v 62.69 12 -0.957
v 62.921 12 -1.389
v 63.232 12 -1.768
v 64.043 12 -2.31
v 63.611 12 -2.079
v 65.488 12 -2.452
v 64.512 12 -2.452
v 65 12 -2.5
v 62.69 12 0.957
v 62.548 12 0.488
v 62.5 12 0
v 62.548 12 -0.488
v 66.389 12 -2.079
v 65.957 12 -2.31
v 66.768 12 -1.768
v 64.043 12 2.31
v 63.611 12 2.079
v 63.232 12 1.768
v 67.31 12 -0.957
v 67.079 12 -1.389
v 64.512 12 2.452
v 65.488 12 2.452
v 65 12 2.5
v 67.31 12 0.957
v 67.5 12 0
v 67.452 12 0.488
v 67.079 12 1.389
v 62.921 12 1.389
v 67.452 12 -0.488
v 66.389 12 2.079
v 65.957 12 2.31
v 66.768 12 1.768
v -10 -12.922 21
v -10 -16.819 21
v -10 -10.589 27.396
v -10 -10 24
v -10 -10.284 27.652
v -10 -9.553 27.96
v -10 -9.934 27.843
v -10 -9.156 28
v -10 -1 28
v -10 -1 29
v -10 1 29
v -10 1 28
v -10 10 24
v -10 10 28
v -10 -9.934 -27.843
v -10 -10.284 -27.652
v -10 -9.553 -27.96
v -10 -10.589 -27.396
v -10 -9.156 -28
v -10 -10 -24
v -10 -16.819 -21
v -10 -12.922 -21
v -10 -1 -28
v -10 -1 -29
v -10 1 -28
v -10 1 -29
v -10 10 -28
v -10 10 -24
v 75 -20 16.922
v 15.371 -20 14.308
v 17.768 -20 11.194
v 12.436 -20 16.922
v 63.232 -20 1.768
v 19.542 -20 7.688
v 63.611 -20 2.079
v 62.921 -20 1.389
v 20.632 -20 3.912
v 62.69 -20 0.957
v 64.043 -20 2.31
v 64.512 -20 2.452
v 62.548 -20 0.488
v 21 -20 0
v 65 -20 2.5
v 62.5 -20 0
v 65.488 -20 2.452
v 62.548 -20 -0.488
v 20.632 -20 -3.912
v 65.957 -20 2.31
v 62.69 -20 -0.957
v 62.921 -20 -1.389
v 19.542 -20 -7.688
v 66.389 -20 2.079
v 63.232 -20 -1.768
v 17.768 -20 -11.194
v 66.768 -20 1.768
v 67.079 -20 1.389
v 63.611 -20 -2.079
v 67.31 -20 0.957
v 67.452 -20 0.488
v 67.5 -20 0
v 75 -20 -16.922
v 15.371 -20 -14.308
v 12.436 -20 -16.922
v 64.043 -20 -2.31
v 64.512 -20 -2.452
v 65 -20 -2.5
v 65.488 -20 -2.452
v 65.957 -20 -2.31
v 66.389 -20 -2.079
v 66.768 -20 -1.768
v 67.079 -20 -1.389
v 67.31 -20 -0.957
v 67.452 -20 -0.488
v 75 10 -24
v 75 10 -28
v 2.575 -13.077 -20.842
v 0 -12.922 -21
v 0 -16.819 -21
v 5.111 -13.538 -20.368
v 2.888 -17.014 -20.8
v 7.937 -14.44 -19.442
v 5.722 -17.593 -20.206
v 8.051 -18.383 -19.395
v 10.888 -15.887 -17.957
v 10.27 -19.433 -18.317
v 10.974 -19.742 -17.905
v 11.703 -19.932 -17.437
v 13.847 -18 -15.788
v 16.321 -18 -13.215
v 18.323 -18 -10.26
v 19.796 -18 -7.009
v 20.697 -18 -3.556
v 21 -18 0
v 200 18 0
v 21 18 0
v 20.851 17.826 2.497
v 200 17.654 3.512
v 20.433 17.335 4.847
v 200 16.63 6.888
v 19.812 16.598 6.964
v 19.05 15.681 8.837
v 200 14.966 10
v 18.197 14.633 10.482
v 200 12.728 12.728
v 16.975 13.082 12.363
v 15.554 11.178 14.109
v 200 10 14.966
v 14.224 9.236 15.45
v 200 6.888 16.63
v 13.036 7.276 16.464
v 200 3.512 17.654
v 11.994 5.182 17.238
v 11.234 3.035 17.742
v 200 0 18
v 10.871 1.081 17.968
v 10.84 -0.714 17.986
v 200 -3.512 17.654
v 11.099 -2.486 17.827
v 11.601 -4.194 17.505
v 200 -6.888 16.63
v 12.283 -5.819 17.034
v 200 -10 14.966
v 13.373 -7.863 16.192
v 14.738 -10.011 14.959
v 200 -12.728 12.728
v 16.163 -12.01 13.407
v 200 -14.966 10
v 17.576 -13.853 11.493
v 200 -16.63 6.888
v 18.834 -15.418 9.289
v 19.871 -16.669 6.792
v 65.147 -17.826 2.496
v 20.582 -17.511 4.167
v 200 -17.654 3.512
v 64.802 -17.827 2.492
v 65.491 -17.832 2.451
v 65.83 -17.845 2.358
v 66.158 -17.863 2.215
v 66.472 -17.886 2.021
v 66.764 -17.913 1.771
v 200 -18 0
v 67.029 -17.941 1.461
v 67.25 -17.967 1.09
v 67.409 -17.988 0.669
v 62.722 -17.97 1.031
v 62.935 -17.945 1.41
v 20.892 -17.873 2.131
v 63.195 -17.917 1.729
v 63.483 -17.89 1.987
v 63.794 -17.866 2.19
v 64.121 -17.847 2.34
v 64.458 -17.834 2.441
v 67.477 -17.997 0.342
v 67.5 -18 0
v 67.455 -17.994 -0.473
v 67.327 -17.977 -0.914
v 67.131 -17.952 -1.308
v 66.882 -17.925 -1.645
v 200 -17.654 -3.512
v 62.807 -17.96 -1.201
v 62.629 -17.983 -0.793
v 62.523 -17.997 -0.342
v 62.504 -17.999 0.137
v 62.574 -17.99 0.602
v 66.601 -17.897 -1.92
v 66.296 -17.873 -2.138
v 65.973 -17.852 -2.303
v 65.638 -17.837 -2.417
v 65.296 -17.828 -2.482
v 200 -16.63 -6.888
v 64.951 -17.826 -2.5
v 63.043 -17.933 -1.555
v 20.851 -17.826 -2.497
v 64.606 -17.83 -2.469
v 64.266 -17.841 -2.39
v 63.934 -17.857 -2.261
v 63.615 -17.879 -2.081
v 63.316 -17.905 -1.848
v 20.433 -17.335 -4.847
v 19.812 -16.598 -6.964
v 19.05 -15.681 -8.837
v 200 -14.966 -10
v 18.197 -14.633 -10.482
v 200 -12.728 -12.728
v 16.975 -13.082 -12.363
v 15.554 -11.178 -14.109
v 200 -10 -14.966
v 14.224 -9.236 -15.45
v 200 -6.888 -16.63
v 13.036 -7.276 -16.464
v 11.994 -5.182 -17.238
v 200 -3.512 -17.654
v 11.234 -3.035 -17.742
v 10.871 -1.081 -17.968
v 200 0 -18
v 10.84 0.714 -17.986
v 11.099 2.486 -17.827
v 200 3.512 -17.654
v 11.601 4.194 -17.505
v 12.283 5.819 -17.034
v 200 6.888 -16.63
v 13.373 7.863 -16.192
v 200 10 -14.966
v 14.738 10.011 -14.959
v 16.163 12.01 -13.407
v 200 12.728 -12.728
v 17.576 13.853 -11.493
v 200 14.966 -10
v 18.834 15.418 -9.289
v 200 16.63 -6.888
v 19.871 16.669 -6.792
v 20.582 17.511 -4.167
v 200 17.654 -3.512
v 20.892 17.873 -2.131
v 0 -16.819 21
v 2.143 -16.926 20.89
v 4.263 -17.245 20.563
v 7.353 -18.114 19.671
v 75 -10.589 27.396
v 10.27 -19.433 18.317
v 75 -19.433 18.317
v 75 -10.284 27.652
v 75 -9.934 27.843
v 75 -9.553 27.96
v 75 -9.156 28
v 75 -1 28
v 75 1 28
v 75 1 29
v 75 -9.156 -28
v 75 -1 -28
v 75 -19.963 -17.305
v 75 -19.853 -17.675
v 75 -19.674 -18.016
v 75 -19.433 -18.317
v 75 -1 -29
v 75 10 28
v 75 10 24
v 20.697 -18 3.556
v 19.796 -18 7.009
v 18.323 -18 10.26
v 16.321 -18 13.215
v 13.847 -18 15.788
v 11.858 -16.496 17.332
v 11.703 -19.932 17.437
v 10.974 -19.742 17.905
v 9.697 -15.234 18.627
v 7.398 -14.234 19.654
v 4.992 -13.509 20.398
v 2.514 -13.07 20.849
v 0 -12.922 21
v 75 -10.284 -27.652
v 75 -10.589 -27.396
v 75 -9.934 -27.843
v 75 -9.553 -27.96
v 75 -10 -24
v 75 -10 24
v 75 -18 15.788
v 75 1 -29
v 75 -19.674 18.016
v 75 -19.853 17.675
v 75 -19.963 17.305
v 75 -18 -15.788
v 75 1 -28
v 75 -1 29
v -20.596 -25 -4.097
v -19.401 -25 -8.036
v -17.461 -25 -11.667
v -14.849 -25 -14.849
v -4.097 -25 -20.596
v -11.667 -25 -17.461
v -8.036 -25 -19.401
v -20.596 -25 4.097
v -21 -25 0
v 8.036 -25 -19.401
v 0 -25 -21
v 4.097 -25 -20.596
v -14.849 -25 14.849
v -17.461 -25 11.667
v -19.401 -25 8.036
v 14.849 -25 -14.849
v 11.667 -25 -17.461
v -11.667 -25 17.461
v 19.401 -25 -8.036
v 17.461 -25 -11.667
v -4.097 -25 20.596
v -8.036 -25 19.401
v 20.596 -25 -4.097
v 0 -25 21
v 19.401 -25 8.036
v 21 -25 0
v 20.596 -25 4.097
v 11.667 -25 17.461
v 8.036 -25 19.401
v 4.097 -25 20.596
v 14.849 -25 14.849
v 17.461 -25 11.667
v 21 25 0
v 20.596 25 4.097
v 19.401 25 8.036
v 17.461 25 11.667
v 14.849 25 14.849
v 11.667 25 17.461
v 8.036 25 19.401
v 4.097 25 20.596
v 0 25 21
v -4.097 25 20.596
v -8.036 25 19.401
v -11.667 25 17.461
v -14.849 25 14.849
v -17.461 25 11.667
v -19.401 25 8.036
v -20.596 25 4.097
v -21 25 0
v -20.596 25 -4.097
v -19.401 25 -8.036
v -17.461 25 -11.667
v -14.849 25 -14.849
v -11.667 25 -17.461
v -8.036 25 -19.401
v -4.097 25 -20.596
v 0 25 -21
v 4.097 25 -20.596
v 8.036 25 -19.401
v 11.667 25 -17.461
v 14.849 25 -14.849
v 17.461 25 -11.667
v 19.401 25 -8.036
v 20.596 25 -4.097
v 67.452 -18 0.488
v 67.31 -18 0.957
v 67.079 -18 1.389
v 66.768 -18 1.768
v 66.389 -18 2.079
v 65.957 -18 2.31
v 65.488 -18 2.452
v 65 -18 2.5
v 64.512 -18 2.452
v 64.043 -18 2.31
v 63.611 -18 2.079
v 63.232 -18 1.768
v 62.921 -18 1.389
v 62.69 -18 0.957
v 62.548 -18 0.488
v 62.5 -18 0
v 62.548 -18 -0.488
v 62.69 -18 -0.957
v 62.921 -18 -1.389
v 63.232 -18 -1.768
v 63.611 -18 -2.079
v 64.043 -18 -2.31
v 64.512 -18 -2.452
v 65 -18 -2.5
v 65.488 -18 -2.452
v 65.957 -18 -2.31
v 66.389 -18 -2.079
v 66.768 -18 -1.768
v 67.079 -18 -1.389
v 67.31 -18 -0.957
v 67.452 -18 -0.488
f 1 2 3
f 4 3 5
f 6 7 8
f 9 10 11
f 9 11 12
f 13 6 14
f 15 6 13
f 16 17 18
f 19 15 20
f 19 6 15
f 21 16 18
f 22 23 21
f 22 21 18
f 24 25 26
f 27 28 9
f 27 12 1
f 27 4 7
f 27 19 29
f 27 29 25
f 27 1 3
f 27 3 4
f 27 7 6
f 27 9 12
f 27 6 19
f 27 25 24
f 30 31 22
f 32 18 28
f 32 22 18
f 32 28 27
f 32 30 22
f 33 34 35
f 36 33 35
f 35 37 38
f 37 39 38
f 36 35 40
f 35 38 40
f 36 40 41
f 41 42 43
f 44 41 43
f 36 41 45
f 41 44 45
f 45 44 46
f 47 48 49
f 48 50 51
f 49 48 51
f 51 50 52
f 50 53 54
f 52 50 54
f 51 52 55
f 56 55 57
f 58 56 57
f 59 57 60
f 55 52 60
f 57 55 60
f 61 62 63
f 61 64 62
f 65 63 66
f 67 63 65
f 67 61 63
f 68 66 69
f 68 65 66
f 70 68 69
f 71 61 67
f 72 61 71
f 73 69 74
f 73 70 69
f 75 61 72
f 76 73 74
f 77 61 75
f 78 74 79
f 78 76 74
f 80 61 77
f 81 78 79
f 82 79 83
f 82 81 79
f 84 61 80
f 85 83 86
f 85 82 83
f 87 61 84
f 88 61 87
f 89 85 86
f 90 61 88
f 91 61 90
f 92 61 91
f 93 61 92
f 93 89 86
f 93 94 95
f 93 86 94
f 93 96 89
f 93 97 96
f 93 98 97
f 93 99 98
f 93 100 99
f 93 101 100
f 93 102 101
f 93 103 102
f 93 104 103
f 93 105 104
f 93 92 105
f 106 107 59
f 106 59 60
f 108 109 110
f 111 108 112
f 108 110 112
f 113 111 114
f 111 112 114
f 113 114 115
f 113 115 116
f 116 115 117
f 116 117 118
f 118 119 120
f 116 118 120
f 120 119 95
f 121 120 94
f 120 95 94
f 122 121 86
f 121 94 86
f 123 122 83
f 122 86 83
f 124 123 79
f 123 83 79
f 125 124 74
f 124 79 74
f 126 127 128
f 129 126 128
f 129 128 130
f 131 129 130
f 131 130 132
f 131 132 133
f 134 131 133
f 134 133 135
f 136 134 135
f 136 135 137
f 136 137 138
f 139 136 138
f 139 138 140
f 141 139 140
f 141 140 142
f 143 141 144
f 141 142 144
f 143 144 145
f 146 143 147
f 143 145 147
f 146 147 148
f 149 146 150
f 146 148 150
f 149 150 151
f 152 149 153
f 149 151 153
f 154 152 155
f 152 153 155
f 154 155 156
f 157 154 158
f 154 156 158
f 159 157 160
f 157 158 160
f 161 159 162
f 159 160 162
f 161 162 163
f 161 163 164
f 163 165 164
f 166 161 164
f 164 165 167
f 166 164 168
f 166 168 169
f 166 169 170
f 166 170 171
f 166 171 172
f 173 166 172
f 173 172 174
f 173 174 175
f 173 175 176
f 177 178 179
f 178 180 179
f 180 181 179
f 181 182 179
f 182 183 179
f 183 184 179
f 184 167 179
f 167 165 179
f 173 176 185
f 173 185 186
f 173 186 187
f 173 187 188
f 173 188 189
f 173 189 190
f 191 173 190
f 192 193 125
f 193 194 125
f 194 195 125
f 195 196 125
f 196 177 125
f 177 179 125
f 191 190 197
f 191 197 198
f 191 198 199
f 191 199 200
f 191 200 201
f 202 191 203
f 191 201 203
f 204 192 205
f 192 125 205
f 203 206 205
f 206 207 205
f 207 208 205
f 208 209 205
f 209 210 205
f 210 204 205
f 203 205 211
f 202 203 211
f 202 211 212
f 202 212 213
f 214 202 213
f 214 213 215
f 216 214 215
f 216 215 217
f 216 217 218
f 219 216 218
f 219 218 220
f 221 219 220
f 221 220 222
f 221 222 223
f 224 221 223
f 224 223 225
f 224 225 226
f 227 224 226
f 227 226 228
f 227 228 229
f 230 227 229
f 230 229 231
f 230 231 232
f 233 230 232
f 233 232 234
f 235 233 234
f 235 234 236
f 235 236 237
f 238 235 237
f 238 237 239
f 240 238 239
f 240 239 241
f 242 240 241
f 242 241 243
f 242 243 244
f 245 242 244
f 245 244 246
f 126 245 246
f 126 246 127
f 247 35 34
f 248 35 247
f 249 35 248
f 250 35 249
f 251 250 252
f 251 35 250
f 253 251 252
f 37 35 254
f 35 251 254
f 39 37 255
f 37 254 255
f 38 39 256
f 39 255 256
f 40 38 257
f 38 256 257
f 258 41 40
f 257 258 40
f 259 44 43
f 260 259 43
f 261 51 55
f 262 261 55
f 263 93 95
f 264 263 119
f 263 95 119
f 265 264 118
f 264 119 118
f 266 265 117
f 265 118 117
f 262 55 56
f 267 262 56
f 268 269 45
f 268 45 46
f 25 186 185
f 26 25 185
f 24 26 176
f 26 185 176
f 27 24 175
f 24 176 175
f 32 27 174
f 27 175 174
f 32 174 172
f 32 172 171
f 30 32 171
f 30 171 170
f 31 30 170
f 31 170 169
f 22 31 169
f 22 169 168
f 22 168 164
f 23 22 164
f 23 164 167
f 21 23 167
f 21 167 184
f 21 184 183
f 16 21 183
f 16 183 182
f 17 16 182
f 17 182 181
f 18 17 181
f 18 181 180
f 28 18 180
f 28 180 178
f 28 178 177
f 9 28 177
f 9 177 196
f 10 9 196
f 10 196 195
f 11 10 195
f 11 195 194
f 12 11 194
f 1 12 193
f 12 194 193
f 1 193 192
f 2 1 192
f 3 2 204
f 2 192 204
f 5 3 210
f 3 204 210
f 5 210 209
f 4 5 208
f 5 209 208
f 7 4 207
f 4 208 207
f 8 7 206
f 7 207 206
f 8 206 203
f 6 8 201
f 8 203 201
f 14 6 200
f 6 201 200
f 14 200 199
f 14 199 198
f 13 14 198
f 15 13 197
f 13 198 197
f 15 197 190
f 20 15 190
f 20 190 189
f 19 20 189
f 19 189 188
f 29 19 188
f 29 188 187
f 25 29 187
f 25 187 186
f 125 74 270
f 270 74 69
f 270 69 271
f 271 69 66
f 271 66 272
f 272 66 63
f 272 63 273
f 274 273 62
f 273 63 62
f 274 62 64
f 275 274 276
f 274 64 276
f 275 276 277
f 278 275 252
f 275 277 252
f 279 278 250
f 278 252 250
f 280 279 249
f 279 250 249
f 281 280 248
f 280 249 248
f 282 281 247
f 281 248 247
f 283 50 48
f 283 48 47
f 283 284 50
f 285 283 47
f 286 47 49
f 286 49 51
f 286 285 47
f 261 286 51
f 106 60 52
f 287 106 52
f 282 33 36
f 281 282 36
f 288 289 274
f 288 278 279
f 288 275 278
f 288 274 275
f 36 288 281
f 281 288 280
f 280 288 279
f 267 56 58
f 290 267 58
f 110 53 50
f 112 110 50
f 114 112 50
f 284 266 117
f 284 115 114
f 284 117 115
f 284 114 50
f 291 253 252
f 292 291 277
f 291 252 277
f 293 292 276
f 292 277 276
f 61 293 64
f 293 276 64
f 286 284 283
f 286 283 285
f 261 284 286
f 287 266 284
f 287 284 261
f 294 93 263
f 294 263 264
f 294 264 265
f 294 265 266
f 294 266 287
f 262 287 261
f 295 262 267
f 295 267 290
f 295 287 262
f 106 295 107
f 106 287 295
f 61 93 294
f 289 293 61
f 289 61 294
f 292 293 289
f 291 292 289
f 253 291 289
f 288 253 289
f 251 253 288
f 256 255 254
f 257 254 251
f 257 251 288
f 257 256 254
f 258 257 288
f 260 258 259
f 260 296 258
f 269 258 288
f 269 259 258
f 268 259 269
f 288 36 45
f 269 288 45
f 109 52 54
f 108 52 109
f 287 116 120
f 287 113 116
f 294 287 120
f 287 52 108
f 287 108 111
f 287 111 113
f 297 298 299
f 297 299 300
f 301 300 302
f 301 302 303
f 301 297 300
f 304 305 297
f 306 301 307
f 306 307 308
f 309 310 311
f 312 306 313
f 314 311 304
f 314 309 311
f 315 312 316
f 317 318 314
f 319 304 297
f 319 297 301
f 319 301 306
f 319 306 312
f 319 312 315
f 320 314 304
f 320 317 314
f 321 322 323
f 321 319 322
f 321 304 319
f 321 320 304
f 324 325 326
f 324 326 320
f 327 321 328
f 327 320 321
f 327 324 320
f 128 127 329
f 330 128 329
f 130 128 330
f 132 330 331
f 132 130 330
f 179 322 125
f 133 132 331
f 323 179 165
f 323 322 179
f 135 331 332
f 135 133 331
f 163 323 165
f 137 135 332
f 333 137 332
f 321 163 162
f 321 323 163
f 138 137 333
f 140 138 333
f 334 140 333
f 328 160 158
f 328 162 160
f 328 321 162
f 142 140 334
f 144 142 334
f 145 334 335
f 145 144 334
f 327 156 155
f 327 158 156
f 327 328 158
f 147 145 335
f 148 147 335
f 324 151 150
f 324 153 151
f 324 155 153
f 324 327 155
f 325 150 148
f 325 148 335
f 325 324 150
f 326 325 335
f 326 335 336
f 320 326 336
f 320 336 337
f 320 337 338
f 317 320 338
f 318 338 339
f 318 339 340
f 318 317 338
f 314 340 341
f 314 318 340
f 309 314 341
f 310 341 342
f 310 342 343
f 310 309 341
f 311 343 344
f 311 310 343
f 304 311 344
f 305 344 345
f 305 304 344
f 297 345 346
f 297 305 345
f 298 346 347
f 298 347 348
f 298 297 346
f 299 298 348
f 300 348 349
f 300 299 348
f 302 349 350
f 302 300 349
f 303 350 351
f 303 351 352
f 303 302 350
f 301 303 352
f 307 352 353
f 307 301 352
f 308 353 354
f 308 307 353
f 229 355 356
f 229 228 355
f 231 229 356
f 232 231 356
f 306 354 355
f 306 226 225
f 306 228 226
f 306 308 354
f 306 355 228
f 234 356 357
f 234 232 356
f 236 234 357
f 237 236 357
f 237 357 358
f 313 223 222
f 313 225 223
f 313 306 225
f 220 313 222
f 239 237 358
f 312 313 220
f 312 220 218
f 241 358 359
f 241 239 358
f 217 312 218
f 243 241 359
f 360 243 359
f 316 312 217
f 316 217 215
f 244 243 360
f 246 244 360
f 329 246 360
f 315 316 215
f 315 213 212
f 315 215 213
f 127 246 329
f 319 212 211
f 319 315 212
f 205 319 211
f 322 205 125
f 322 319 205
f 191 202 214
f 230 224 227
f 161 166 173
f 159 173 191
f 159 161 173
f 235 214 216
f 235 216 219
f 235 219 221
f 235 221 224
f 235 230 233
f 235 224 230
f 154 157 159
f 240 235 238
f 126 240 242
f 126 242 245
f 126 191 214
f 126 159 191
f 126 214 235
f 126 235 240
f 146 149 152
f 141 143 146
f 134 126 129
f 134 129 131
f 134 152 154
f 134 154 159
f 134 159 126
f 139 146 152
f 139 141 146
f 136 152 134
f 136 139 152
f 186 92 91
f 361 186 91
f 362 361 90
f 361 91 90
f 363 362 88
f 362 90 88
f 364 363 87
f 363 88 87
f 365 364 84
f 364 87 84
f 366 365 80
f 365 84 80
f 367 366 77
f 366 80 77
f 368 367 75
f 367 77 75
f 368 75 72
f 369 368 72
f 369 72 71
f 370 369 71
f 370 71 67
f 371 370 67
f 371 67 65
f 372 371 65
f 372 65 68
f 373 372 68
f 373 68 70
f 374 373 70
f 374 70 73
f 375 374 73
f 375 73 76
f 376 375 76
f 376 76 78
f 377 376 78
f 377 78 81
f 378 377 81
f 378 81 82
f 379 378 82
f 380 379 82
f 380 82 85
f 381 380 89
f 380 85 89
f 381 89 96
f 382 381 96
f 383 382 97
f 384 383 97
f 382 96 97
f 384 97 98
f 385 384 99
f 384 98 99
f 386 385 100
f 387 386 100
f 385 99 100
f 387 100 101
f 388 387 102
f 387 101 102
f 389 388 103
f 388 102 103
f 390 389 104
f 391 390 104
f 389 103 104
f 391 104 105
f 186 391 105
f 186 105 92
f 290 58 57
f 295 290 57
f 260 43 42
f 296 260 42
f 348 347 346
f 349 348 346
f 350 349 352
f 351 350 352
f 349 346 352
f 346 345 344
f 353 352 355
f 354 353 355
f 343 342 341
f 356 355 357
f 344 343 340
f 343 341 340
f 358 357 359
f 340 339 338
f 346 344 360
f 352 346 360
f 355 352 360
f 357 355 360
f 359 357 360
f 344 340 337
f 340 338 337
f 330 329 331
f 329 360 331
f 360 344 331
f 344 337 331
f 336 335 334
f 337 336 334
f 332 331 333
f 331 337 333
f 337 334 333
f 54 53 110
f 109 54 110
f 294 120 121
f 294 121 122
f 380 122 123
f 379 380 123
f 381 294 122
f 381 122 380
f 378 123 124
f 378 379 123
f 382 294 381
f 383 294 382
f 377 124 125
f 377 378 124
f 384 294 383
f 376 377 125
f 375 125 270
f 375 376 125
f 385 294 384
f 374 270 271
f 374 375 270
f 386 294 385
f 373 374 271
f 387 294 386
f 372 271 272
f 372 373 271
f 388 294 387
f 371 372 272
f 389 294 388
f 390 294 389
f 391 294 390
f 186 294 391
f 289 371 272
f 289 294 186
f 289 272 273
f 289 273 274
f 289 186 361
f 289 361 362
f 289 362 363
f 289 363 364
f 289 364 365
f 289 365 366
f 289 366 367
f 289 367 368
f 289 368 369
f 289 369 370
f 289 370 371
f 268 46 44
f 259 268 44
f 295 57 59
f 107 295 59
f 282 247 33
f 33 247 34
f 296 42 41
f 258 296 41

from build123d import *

# Parameters (mm, degrees)
F0_R      = 21
F1_DEPTH  = 25
F2_R      = 18
F3_DEPTH  = 200
F5_R      = 2.5
F6_DEPTH  = 30
F9_DEPTH  = 85
F11_DEPTH = 85
F13_DEPTH = 45.0010001
F14_R     = 2.5
F15_DEPTH = 45.0010001
F17_R     = 2


with BuildPart() as f1:
    # F0 (on Front) → F1 (new body, symmetric)
    with BuildSketch(Plane.XZ):
        Circle(F0_R)
    extrude(amount=F1_DEPTH, both=True)

    # F2 (on Right) → F3 (join)
    with BuildSketch(Plane.YZ):
        Circle(F2_R)
    extrude(amount=F3_DEPTH)

    # F5 (on offset) → F6 (cut)
    with BuildSketch(Plane.XZ.offset(18)):
        with Locations((65, 0)):
            Circle(F5_R)
    extrude(amount=-F6_DEPTH, mode=Mode.SUBTRACT)


with BuildPart() as f9:
    # F8 (on offset) → F9 (new body)
    with BuildSketch(Plane.YZ.offset(-10)):
        Polygon((0, 24), (0, 29), (-1, 29), (-1, 28), (-10, 28), (-10, 24), align=None)
        Polygon((1, 29), (0, 29), (0, 24), (10, 24), (10, 28), (1, 28), align=None)
    extrude(amount=F9_DEPTH)


with BuildPart() as f9b:
    # F8 (on offset) → F9, piece 2 (new body)
    with BuildSketch(Plane.YZ.offset(-10)):
        Polygon((0, -29), (0, -24), (-10, -24), (-10, -28), (-1, -28), (-1, -29), align=None)
        Polygon((10, -24), (0, -24), (0, -29), (1, -29), (1, -28), (10, -28), align=None)
    extrude(amount=F9_DEPTH)


with BuildPart() as f11:
    # F10 (on face) → F11 (new body)
    with BuildSketch(Plane.YZ.offset(75)):
        Polygon((-18, -15.7878436148), (-18, 0), (-20, 0), (-20, -17.7348045185), (-10, -28), (-10, -24), align=None)
        Polygon((-20, 0), (-18, 0), (-18, 15.7878436148), (-10, 24), (-10, 28), (-20, 17.7348045185), align=None)
    extrude(amount=-F11_DEPTH)

    # F12 (on face) → F13 (cut, through all)
    with BuildSketch(Plane.XZ.offset(20)):
        with BuildLine():
            ThreePointArc((0, -21), (14.8492424049, -14.8492424049), (21, 0))
            ThreePointArc((21, 0), (14.8492424049, 14.8492424049), (0, 21))
            ThreePointArc((0, 21), (-5.1580087454, 20.356692899), (-10, 18.4661853126))
            ThreePointArc((-10, 18.4661853126), (-21, 0), (-10, -18.4661853126))
            ThreePointArc((-10, -18.4661853126), (-5.1580087454, -20.356692899), (0, -21))
        make_face()
        with BuildLine():
            ThreePointArc((-10, 18.4661853126), (-5.1580087454, 20.356692899), (0, 21))
            Line((0, 21), (-10, 21))
            Line((-10, 21), (-10, 18.4661853126))
        make_face()
        with BuildLine():
            Line((-10, -21), (0, -21))
            ThreePointArc((0, -21), (-5.1580087454, -20.356692899), (-10, -18.4661853126))
            Line((-10, -18.4661853126), (-10, -21))
        make_face()
    extrude(amount=-F13_DEPTH, mode=Mode.SUBTRACT)

    # F14 (on face) → F15 (cut, through all)
    with BuildSketch(Plane.XZ.offset(20)):
        with Locations((65, 0)):
            Circle(F14_R)
    extrude(amount=-F15_DEPTH, mode=Mode.SUBTRACT)


with BuildPart() as f9_1:
    add(f9.part)

    # F16: union F9b, F11
    add(f9b.part)
    add(f11.part)

    # F17
    f17_edges = [f9_1.edges().sort_by_distance(p)[0] for p in [
        (32.5, -10, 28),
        (43.123093, -20, 17.734805),
        (43.123093, -20, -17.734805),
        (32.5, -10, -28),
    ]]
    fillet(f17_edges, radius=F17_R)


solid = Compound([f1.part, f9_1.part])
